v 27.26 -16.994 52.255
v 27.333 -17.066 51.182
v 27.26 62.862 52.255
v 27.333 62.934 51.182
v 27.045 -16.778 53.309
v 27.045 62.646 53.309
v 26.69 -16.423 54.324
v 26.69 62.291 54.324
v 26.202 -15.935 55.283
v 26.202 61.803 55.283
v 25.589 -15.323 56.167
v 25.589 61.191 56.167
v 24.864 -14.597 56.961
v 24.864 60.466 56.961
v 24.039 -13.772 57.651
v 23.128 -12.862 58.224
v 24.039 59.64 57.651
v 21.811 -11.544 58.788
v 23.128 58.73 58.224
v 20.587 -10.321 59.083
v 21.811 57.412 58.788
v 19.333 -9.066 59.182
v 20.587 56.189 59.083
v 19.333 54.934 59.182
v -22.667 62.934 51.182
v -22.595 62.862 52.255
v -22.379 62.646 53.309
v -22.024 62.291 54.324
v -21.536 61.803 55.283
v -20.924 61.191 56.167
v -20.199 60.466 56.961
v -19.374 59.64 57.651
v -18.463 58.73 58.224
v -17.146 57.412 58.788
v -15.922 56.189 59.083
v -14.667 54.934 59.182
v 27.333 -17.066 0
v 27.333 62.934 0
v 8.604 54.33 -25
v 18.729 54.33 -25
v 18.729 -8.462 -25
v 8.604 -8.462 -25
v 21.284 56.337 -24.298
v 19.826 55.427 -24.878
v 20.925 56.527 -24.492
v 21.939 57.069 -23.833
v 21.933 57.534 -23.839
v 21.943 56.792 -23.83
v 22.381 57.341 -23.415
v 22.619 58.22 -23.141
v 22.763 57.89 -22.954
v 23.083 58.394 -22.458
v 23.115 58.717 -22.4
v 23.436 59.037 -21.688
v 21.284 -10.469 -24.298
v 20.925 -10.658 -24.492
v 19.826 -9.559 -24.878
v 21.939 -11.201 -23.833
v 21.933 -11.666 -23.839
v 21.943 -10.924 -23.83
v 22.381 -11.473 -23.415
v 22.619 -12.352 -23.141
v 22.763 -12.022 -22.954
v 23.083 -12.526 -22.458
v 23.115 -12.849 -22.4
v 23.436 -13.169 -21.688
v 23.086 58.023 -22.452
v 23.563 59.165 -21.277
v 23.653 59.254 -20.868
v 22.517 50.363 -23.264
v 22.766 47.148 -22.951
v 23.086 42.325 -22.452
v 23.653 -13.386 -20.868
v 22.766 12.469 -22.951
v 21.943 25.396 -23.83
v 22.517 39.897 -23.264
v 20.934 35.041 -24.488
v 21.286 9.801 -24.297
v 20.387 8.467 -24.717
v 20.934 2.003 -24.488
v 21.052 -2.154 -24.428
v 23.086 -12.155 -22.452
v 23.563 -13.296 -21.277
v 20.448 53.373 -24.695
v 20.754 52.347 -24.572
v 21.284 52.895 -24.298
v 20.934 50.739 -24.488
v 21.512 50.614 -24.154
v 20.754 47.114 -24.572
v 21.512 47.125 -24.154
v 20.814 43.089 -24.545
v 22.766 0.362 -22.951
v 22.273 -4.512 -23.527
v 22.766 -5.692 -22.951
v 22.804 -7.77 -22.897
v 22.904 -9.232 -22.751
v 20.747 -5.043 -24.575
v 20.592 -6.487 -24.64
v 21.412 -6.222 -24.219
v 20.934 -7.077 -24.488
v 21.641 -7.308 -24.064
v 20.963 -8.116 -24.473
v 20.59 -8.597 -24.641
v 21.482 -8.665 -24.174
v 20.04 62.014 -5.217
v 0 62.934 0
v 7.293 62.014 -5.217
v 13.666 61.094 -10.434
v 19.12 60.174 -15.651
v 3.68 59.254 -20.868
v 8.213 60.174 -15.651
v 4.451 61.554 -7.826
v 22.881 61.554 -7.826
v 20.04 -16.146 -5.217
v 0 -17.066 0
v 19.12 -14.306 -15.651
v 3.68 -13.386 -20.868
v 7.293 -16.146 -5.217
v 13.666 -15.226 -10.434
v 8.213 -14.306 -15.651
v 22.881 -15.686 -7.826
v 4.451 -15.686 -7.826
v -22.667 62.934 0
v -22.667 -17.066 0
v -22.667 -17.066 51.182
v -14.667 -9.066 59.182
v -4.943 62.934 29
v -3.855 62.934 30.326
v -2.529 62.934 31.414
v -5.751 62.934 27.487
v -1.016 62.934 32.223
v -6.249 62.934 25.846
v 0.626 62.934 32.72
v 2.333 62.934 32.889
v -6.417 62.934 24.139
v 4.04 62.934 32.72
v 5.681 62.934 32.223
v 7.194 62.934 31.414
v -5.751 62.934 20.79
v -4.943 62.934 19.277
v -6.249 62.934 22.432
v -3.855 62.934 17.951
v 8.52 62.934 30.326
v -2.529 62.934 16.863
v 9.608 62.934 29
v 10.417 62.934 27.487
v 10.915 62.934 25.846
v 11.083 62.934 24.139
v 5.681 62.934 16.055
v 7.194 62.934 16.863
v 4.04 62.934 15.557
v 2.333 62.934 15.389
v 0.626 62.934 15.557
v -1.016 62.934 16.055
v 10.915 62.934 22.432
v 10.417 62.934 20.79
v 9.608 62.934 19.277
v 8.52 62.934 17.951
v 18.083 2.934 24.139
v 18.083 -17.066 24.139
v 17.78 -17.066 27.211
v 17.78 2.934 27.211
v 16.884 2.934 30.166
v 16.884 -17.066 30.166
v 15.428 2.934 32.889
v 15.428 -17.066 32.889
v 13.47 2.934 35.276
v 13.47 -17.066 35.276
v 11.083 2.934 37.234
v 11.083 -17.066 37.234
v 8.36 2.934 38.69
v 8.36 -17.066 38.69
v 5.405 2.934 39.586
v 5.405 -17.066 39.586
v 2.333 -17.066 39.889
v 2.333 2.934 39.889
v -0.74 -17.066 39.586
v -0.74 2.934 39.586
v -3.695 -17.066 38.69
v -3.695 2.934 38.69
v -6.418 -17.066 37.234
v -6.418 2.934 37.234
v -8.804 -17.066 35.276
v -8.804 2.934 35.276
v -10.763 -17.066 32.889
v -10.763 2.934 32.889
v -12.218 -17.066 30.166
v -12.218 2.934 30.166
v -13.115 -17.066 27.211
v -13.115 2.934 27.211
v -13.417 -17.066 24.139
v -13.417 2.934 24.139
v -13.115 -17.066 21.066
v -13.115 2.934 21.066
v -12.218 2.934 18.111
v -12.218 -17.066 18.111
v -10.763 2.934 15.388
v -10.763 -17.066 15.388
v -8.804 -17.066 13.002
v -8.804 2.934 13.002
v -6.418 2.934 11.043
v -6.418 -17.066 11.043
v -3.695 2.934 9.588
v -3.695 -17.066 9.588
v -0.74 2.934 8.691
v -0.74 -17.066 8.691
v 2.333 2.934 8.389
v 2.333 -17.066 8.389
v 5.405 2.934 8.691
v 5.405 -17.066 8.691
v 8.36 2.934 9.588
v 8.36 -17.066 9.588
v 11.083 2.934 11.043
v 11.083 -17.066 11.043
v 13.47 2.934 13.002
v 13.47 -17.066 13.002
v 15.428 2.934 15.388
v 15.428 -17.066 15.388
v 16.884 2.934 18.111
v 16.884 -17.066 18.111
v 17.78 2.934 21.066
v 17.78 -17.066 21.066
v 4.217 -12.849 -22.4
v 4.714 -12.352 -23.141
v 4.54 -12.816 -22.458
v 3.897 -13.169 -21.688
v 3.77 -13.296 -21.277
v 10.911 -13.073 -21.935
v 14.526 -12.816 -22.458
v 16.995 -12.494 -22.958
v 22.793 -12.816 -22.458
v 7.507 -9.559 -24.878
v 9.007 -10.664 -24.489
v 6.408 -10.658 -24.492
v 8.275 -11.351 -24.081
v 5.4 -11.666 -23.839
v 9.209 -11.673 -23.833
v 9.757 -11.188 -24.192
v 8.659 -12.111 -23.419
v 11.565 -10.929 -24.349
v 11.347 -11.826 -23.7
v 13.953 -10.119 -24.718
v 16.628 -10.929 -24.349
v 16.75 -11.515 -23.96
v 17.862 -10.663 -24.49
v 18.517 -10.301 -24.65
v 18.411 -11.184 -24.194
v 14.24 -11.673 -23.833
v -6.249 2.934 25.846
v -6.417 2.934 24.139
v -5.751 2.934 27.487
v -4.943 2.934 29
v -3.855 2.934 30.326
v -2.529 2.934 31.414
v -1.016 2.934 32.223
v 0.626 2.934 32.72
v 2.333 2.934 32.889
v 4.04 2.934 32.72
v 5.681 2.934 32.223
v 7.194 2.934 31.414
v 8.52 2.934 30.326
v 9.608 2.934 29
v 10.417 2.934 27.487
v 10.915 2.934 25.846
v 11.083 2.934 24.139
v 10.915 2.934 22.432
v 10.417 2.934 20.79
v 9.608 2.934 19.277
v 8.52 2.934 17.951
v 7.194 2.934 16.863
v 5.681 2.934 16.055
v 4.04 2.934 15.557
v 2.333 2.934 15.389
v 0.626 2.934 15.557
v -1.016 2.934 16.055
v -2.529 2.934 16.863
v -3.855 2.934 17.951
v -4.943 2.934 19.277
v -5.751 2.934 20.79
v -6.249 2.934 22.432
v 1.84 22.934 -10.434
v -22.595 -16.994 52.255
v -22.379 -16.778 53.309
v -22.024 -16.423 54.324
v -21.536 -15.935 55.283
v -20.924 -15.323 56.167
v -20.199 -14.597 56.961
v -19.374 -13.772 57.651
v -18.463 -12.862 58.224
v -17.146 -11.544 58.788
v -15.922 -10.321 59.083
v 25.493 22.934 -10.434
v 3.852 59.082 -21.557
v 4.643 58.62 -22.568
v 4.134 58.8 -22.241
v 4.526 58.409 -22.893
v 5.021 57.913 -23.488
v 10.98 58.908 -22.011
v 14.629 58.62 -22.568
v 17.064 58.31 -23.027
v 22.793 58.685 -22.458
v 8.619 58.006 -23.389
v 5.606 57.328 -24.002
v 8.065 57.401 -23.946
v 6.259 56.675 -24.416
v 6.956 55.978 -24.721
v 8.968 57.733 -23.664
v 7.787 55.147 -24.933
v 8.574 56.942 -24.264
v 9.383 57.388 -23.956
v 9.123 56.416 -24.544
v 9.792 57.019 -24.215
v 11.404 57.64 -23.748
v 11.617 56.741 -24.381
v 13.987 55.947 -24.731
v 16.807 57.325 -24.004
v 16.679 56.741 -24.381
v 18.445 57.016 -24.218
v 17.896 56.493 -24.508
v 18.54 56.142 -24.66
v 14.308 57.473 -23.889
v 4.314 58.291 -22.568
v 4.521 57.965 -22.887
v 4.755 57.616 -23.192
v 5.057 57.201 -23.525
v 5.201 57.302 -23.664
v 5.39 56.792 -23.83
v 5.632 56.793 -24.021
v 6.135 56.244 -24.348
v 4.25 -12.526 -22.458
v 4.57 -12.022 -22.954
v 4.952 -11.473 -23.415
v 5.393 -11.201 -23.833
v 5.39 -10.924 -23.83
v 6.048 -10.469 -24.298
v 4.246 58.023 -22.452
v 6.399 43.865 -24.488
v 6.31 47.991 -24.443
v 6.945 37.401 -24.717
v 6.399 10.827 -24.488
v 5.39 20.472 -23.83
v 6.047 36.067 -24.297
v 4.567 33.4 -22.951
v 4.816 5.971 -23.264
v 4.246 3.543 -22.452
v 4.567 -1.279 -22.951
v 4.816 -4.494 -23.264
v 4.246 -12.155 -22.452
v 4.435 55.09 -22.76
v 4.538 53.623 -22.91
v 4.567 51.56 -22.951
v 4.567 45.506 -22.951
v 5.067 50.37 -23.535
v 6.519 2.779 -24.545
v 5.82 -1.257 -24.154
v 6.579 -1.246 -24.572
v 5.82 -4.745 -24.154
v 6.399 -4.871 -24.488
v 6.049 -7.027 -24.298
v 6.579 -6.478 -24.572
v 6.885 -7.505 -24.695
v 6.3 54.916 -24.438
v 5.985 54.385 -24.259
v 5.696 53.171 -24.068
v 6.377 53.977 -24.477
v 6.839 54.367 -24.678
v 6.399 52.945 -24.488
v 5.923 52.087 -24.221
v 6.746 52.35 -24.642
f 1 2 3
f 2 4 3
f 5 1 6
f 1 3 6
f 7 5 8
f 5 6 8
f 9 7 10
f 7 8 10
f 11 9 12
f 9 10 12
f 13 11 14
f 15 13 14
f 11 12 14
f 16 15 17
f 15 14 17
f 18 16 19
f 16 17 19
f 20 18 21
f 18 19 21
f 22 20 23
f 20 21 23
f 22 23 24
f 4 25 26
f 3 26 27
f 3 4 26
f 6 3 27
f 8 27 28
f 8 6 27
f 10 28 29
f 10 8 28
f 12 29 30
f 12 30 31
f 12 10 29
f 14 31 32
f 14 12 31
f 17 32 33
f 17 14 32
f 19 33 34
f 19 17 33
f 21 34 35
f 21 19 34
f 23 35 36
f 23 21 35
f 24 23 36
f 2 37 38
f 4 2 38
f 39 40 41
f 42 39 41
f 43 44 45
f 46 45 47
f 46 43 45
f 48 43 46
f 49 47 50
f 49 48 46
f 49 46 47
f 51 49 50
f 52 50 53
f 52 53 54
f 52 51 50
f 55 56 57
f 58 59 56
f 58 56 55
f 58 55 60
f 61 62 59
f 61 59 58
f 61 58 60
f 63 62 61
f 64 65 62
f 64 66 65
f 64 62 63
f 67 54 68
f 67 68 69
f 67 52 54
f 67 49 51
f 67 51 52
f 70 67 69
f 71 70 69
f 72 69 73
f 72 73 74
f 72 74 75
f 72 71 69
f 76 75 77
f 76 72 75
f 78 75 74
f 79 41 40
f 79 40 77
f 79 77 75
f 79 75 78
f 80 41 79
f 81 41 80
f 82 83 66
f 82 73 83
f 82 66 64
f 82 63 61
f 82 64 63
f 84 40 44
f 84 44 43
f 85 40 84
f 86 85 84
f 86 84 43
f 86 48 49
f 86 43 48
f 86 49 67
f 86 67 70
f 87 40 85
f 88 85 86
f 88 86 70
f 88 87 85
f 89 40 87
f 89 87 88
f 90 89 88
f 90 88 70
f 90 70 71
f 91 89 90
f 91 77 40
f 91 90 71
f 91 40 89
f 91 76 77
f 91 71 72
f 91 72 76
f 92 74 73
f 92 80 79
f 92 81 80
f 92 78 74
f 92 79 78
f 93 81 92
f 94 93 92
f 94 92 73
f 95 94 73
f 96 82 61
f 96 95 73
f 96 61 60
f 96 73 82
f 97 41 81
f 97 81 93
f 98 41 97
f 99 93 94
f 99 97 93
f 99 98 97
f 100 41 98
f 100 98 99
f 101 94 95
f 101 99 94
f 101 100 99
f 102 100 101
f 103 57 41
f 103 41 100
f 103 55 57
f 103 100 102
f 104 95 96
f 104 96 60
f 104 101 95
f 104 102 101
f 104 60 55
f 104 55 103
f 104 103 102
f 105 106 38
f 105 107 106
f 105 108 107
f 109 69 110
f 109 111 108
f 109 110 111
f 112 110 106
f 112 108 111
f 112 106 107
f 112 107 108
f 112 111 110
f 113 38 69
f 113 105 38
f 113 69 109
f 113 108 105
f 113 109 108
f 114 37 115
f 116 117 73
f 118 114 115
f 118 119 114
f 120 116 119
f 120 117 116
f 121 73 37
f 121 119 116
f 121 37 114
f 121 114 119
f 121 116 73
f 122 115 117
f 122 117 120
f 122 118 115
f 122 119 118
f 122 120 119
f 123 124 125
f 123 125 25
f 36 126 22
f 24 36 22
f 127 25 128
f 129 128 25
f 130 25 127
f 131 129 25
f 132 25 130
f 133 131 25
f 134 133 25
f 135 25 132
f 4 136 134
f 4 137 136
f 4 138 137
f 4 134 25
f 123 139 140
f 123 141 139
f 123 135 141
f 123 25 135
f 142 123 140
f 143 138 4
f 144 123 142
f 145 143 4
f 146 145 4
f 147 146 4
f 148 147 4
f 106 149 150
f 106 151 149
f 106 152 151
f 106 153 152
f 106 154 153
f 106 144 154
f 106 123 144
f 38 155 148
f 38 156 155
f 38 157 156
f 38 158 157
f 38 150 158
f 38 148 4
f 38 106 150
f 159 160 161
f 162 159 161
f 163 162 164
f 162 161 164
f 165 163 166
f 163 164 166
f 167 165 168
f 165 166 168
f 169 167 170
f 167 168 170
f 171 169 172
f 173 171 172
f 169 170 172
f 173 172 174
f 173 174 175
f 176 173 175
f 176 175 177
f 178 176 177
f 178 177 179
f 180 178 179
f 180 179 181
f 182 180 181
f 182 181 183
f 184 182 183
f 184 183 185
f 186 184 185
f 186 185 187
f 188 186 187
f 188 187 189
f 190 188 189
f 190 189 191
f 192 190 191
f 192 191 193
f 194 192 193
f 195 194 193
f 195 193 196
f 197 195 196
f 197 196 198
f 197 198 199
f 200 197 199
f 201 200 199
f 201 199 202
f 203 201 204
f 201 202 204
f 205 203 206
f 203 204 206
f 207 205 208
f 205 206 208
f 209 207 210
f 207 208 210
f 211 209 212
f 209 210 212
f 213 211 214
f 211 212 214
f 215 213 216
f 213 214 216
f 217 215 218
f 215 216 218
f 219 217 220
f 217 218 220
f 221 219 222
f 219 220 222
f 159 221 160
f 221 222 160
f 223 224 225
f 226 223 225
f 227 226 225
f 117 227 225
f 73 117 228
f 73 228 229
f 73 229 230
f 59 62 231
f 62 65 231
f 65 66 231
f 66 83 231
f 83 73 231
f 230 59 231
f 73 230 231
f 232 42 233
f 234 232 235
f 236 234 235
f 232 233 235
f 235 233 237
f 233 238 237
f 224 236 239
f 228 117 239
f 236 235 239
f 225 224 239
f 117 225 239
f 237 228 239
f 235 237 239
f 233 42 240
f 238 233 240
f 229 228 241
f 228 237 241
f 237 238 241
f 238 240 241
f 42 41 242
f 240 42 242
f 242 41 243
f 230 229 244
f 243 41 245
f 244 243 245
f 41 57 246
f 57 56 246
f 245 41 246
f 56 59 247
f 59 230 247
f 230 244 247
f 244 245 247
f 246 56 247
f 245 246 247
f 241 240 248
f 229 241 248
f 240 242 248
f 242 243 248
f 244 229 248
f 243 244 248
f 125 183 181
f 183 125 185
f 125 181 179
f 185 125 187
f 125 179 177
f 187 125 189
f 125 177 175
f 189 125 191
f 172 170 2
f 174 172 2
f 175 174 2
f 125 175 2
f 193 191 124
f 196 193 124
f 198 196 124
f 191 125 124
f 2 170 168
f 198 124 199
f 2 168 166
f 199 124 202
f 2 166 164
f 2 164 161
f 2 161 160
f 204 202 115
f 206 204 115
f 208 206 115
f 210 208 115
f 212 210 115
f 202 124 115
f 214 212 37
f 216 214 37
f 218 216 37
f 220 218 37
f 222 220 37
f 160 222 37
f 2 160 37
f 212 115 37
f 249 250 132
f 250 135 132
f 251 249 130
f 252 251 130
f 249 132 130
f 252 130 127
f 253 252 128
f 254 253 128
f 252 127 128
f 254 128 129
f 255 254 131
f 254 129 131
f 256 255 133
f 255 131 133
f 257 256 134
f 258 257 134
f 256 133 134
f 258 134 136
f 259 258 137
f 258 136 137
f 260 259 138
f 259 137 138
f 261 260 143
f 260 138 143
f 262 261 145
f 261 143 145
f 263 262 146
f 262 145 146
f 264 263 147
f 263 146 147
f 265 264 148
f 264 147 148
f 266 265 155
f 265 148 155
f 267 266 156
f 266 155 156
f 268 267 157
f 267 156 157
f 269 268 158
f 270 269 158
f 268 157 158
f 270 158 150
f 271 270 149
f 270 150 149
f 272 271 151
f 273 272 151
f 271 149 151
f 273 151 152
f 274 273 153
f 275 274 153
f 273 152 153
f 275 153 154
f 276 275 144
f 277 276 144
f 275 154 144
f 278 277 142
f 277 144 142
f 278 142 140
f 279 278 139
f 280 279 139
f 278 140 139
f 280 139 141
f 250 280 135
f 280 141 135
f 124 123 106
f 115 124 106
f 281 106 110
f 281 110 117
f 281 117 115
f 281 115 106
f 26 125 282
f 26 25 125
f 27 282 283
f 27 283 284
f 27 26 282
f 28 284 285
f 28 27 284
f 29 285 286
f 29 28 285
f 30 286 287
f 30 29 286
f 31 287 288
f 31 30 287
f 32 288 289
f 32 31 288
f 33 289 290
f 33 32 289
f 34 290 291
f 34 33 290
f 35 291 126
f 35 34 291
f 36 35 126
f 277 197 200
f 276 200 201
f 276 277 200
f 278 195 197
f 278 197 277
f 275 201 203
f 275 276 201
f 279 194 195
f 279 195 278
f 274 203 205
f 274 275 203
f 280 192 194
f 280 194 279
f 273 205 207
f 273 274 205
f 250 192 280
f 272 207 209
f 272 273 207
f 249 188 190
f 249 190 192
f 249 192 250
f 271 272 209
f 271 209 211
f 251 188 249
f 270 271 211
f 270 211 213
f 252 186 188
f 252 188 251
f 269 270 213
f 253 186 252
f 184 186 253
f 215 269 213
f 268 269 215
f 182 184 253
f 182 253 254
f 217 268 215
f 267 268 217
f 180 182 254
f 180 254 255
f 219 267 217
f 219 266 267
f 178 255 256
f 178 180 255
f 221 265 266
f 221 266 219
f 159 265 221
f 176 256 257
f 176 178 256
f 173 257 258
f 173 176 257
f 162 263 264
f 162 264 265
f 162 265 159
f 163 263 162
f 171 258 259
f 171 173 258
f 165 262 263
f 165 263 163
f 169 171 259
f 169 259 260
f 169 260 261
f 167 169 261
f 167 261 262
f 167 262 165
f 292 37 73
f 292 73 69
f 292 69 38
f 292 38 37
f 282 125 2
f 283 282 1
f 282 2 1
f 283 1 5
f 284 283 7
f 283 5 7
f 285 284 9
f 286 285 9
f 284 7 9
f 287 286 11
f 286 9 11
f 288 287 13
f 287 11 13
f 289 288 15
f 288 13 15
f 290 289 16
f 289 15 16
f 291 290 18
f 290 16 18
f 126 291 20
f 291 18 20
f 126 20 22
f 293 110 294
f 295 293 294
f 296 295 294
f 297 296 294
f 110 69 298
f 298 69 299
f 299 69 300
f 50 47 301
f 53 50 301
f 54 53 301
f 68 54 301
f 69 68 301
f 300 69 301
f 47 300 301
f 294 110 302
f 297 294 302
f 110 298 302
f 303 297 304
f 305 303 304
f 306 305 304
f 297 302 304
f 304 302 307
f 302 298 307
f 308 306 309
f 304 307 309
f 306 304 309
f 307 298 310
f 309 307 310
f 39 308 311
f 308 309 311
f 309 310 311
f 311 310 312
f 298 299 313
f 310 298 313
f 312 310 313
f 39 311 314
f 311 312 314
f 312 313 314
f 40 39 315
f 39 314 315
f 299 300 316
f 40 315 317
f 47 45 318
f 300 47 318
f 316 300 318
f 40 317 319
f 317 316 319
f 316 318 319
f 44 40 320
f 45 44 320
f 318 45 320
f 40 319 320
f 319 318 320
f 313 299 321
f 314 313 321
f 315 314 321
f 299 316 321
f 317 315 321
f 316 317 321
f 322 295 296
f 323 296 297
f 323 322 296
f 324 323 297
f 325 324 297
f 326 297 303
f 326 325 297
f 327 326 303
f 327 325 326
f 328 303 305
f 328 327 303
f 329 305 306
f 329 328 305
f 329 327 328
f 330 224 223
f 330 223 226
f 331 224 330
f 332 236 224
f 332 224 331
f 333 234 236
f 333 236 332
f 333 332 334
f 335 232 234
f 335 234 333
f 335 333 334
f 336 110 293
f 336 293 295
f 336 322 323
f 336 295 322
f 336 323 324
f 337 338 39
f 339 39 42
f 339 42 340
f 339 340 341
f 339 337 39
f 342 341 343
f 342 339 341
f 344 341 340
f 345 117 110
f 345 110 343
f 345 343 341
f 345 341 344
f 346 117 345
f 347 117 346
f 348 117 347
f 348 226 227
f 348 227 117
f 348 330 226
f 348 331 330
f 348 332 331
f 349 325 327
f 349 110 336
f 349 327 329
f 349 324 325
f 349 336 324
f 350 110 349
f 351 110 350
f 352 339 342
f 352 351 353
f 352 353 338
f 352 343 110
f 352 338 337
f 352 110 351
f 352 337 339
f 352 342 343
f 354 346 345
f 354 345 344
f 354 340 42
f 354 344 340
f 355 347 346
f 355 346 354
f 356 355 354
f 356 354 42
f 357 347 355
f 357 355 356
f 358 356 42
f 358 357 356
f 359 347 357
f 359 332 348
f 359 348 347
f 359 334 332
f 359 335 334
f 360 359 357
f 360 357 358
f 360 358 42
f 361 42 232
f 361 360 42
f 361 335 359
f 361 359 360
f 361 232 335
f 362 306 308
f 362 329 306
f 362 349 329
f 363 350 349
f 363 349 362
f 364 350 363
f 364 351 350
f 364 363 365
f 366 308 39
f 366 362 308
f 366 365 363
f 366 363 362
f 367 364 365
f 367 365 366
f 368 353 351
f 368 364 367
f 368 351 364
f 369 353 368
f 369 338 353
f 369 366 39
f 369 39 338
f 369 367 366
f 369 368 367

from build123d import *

# Parameters (mm, degrees)
F0_W           = 50
F0_H           = 80
F1_DEPTH       = 59.182
F2_R           = 8
F4_D           = 17.5
F4_CBORE_D     = 31.5
F4_CBORE_DEPTH = 20
F5_W           = 27.3326538503
F5_H           = 80
F6_DEPTH       = 25
F6_TAPER       = 10
F7_R           = 5


with BuildPart() as f1:
    # F0 (on Top) → F1 (new body)
    with BuildSketch(Plane.XY):
        with Locations((2.3326538503, 22.9340901269)):
            Rectangle(F0_W, F0_H)
    extrude(amount=F1_DEPTH)

    # F2
    f2_edges = [f1.edges().sort_by_distance(p)[0] for p in [
        (-22.667346, 22.93409, 59.182),
        (2.332654, -17.06591, 59.182),
        (27.332654, 22.93409, 59.182),
        (2.332654, 62.93409, 59.182),
    ]]
    fillet(f2_edges, radius=F2_R)

    # F4 (through all)
    with Locations(Plane.XZ.offset(17.0659098731)):
        with Locations((2.3326538503, 24.1386201233)):
            CounterBoreHole(F4_D / 2, F4_CBORE_D / 2, F4_CBORE_DEPTH)

    # F5 (on face) → F6 (join)
    with BuildSketch(Plane(origin=(0, 0, 0), x_dir=(1, 0, 0), z_dir=(0, 0, -1))):
        with Locations((13.6663269252, -22.9340901269)):
            Rectangle(F5_W, F5_H)
    extrude(amount=F6_DEPTH, taper=F6_TAPER)

    # F7
    f7_edges = [f1.edges().sort_by_distance(p)[0] for p in [
        (22.924479, 22.93409, -25),
        (13.666327, -12.657735, -25),
        (4.408175, 22.93409, -25),
        (13.666327, 58.525916, -25),
    ]]
    fillet(f7_edges, radius=F7_R)


solid = f1.part
